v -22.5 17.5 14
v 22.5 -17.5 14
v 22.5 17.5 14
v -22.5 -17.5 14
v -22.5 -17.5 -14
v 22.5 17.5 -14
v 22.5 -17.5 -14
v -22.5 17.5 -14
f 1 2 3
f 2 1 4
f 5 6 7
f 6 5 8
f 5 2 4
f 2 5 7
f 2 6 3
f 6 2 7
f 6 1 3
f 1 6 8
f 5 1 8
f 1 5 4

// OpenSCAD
/**
 * Library Test Example
 * Demonstrates using OpenSCAD library bundles (MCAD)
 * @license CC0-1.0 (Public Domain)
 */

// This example uses MCAD library for rounded boxes
use <MCAD/boxes.scad>;

/*[Dimensions]*/
// Box width (mm)
width = 45; // [20:100]

// Box depth (mm)
depth = 35; // [20:100]

// Box height (mm)
height = 28; // [10:50]

// Corner radius (mm)
radius = 4; // [1:15]

/*[Options]*/
// Box style (Note: "Rounded" may cause CGAL errors with certain parameter combinations)
style = "Simple"; // [Simple, Rounded]

/*[Hidden]*/
// Fragment number for curves
$fn = 64;

/*[Style Options]*/
// Round only the sides (faster) or all edges including top/bottom
sidesonly = true; // [true, false]

// Main module
module main() {
    if (style == "Rounded") {
        // Use MCAD's rounded box function
        // roundedBox(size, radius, sidesonly)
        // - size: [x, y, z] dimensions
        // - radius: corner radius  
        // - sidesonly: true = round only vertical edges, false = round all edges
        roundedBox([width, depth, height], radius, sidesonly);
    } else {
        // Simple cube for comparison
        cube([width, depth, height], center=true);
    }
}

// Render
main();
